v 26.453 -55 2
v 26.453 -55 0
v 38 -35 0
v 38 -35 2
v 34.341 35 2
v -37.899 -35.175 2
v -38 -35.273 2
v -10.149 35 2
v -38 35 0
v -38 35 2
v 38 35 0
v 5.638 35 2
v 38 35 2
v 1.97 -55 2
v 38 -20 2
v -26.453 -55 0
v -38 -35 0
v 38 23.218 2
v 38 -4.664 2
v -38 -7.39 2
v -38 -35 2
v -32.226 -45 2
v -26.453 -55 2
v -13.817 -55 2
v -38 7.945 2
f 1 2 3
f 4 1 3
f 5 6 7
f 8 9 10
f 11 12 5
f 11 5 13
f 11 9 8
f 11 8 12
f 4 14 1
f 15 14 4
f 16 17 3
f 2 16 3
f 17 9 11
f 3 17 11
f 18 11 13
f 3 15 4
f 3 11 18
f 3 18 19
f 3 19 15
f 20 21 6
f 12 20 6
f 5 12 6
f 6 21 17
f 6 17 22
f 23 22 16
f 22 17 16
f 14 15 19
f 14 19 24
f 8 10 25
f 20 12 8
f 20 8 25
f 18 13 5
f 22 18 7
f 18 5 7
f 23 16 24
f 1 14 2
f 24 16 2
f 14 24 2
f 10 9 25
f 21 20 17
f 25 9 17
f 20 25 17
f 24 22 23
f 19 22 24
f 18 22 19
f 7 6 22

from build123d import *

# Parameters (mm, degrees)
BOSS_EXTRUDE1_DEPTH = 2
BOSS_EXTRUDE2_DEPTH = 0.0001


with BuildPart() as part:
    # Sketch1 → Boss-Extrude1 (new body)
    with BuildSketch(Plane.XY):
        Polygon((-38, -35), (-26.452994616, -55), (26.452994616, -55), (38, -35), (38, 35), (-38, 35), align=None)
    extrude(amount=BOSS_EXTRUDE1_DEPTH)

    # Sketch2 → Boss-Extrude2 (add)
    with BuildSketch(Plane.XY.offset(2)):
        Polygon((-38, 7.945483094), (-10.149076909, 35), (5.637899584, 35), (-38, -7.390059683), align=None)
        Polygon((-38, -35.272864732), (34.341493208, 35), (38, 35), (38, 23.218347826), (-32.226497308, -45), align=None)
        Polygon((-13.81727456, -55), (38, -4.664457223), (38, -20), (1.969701933, -55), align=None)
    extrude(amount=BOSS_EXTRUDE2_DEPTH)


solid = part.part
